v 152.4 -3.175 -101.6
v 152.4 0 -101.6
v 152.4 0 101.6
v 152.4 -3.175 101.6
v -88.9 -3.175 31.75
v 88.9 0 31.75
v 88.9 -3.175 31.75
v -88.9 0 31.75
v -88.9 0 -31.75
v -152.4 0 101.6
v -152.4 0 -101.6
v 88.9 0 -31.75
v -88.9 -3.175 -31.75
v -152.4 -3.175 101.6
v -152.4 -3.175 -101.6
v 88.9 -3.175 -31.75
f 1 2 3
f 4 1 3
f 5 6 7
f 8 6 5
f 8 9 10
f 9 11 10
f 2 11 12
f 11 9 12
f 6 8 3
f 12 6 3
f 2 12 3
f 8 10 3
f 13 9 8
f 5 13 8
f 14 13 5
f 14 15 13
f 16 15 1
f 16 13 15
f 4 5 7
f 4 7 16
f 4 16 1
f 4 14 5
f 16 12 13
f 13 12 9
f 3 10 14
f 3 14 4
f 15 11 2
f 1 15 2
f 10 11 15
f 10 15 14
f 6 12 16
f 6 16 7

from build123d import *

# Parameters (mm, degrees)
F0_W     = 304.8
F0_H     = 203.2
F1_DEPTH = 3.175
F2_W     = 177.8
F2_H     = 63.5
F3_DEPTH = 12.7


with BuildPart() as f1:
    # F0 (on Front) → F1 (new body)
    with BuildSketch(Plane.XZ):
        Rectangle(F0_W, F0_H)
    extrude(amount=F1_DEPTH)

    # F2 (on face) → F3 (cut, symmetric)
    with BuildSketch(Plane(origin=(0, 0, 0), x_dir=(-1, 0, 0), z_dir=(0, 1, 0))):
        Rectangle(F2_W, F2_H)
    extrude(amount=F3_DEPTH, both=True, mode=Mode.SUBTRACT)


solid = f1.part
